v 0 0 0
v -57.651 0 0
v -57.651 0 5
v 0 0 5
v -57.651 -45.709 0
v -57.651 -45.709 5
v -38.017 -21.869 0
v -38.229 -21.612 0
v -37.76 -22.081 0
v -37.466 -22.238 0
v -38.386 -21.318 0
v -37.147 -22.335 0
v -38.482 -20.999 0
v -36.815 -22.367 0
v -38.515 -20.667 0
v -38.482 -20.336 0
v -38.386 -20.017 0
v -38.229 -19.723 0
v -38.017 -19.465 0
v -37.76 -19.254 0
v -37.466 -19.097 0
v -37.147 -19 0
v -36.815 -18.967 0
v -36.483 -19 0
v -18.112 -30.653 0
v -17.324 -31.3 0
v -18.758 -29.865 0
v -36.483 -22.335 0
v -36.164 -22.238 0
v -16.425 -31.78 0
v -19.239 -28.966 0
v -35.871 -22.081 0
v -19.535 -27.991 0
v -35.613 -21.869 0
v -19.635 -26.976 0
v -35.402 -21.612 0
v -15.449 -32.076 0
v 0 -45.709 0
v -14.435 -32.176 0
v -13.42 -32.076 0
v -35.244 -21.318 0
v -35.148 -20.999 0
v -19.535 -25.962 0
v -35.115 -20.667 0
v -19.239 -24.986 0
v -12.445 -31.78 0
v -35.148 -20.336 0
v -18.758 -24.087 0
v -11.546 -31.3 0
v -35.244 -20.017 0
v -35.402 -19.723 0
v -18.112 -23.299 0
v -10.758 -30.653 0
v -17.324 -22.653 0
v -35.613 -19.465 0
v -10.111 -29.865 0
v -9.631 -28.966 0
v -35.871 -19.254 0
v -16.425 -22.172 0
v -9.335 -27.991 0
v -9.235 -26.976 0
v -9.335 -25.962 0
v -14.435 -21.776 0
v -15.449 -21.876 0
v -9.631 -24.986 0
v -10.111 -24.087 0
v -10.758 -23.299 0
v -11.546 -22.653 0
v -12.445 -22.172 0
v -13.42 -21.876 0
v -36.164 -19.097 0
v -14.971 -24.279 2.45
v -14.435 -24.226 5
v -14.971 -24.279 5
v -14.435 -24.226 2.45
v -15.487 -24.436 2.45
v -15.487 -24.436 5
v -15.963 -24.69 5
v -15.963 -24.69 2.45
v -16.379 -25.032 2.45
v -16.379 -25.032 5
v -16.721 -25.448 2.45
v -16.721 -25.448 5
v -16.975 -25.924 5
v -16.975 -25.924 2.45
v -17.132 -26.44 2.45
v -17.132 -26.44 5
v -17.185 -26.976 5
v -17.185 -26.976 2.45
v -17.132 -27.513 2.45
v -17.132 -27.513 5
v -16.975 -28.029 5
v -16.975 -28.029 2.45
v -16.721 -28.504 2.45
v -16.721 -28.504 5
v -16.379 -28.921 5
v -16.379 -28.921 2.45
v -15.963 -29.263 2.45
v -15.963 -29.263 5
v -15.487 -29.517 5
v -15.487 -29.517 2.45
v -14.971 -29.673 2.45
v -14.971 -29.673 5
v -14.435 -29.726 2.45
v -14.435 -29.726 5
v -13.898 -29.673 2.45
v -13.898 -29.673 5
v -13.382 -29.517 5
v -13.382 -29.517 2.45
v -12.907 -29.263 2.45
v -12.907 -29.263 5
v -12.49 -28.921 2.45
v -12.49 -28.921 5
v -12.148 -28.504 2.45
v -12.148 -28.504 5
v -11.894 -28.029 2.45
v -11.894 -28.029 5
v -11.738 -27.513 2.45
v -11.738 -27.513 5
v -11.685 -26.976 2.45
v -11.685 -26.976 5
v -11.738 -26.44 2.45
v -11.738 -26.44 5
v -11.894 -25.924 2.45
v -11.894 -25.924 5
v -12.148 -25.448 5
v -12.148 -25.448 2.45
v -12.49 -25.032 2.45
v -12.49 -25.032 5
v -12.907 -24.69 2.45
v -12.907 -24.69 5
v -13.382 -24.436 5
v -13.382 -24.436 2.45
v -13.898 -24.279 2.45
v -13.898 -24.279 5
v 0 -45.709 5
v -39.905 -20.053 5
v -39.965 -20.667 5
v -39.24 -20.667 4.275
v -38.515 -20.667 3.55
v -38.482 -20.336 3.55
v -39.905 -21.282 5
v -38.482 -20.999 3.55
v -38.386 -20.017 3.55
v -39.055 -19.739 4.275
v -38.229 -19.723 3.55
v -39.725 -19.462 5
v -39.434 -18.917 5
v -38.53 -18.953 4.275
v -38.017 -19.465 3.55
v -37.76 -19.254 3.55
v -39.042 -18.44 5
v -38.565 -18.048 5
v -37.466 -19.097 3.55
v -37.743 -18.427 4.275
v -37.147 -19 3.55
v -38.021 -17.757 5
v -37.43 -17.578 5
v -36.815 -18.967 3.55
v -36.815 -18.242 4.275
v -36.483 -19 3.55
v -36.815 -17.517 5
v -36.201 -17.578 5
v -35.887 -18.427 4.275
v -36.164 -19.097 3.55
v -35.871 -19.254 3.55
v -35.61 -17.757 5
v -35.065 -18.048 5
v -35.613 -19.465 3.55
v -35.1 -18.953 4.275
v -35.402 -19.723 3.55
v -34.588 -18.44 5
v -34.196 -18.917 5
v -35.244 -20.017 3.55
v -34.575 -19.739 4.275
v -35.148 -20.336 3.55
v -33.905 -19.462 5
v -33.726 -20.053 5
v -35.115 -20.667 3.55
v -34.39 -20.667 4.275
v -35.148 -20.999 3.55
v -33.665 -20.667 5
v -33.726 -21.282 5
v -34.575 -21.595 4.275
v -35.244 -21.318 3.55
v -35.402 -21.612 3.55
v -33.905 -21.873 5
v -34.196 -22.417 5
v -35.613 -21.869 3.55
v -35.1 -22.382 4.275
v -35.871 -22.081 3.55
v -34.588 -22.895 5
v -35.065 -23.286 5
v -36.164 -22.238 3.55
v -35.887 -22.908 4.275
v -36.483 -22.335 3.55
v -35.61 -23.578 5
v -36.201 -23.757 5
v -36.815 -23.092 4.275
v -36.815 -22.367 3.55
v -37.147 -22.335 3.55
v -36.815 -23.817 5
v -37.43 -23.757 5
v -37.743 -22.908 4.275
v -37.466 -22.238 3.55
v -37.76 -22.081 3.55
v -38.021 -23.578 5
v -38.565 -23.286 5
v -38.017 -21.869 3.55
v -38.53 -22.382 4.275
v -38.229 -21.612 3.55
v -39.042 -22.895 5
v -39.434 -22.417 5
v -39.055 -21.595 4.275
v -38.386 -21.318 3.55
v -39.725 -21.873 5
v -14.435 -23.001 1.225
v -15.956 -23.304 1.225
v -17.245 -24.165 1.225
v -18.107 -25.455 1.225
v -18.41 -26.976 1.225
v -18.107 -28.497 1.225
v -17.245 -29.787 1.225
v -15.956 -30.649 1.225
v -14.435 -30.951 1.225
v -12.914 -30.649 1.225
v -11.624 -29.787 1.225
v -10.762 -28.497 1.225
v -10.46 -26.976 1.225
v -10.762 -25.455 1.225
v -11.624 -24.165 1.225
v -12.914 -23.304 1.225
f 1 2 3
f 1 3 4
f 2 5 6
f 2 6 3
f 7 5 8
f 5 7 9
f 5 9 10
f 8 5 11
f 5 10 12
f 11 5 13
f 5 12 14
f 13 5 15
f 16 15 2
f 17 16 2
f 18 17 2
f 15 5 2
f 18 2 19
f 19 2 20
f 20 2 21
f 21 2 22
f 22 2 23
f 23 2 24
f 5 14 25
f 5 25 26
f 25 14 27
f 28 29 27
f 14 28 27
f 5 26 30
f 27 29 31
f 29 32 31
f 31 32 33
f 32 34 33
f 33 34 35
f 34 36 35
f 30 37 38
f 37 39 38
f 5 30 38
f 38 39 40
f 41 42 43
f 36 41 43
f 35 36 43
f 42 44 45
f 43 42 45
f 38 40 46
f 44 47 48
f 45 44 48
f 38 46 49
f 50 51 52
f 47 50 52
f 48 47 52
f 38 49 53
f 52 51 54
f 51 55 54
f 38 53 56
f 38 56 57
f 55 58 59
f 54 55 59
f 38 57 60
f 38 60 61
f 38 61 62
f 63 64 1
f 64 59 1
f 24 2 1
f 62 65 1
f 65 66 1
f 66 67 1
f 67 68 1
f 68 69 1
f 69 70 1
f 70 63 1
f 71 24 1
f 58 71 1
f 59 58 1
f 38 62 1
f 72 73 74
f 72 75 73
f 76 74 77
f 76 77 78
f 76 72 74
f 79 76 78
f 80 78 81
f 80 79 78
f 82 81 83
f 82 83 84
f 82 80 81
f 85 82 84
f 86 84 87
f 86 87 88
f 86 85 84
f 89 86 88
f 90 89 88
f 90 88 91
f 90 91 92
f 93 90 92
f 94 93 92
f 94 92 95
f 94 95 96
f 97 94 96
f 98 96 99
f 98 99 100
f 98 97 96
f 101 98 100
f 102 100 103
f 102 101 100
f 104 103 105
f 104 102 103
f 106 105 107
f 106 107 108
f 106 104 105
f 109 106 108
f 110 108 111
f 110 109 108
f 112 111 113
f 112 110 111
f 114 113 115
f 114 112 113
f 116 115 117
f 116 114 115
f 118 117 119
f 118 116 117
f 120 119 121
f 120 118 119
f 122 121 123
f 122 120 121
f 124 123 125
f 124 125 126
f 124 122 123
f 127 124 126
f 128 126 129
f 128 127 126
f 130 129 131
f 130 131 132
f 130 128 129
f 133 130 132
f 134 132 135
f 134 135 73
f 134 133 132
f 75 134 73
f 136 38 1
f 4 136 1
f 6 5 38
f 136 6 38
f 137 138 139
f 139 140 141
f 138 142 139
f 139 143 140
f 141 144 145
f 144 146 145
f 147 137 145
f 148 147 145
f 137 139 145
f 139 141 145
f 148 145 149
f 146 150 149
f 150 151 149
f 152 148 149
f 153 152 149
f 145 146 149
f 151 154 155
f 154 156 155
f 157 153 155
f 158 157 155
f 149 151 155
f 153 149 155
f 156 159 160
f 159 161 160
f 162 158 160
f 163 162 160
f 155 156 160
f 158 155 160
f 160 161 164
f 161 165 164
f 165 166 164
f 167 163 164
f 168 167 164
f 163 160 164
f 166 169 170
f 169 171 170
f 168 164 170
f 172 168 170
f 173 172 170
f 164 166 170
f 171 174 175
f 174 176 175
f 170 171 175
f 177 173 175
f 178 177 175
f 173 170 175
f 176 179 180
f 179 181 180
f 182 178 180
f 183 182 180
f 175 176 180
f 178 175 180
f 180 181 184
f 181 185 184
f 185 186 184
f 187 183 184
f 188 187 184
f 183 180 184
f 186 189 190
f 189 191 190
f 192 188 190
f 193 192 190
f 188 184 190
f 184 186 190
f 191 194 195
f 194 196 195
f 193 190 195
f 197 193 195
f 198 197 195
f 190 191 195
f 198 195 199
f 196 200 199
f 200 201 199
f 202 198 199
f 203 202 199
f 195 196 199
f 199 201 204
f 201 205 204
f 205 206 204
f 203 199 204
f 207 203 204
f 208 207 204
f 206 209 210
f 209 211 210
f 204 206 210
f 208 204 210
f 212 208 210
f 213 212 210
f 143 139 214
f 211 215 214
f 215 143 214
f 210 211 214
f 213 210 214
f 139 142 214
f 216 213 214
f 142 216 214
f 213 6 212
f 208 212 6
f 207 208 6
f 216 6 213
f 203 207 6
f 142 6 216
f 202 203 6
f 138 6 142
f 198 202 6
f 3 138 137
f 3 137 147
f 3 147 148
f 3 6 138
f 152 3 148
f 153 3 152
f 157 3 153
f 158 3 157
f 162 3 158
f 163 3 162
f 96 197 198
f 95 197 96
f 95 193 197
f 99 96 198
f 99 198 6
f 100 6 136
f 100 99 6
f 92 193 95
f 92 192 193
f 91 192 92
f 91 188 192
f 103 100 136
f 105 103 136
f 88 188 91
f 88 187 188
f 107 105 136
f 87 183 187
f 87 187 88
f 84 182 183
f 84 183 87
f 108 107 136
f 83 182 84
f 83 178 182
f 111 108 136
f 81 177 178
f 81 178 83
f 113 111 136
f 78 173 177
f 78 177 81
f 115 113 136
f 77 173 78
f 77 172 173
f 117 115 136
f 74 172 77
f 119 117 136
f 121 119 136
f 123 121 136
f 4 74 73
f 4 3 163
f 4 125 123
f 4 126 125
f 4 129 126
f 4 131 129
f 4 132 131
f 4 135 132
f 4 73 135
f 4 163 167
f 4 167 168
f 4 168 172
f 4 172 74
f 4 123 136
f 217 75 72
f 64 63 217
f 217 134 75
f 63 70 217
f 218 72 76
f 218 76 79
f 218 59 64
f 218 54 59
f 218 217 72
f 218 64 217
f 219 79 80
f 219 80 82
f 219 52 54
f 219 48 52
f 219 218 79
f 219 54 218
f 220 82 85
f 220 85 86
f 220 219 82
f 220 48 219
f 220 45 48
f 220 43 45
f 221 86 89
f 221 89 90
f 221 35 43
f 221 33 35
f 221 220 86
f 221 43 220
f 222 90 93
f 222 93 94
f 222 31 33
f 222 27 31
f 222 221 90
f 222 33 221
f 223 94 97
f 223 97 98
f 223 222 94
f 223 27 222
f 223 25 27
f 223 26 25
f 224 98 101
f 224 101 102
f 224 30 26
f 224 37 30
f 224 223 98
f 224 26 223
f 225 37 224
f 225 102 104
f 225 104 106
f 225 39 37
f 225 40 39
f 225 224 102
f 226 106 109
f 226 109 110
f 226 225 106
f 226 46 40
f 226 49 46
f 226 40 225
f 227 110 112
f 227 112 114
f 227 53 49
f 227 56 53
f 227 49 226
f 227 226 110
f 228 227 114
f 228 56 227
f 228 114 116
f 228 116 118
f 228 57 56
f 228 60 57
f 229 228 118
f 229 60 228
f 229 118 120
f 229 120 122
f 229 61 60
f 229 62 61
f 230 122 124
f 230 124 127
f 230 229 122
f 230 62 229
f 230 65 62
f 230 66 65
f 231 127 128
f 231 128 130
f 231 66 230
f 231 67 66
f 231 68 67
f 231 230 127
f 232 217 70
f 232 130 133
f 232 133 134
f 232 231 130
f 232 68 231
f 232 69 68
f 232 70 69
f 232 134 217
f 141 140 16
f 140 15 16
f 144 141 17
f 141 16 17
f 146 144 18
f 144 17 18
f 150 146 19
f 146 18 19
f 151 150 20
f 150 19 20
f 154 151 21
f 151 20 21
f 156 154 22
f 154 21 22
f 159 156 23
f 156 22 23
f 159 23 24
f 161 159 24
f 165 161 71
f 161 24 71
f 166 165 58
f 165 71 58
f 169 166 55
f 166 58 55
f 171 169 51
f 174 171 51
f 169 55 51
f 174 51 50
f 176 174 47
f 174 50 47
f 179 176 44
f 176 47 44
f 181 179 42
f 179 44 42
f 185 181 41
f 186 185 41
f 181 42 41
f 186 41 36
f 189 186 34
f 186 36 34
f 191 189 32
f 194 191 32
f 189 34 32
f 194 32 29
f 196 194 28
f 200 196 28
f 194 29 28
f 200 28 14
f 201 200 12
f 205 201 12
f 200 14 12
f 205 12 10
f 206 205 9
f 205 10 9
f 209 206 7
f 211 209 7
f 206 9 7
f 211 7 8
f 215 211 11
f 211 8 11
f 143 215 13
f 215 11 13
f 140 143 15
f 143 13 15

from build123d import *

# Parameters (mm, degrees)
SKETCH1_W                                           = 57.650718963
SKETCH1_H                                           = 45.709483456
BOSS_EXTRUDE1_DEPTH                                 = 5
CSK_FOR_M3_COUNTERSUNK_FLAT_HEAD_SCREW2_D           = 3.4
CSK_FOR_M3_COUNTERSUNK_FLAT_HEAD_SCREW2_CSINK_D     = 6.3
CSK_FOR_M3_COUNTERSUNK_FLAT_HEAD_SCREW2_CSINK_ANGLE = 90


with BuildPart() as part:
    # Sketch1 → Boss-Extrude1 (new body)
    with BuildSketch(Plane.XY):
        with Locations((-28.825359482, -22.854741728)):
            Rectangle(SKETCH1_W, SKETCH1_H)
    extrude(amount=BOSS_EXTRUDE1_DEPTH)

    # CSK for M3 Countersunk Flat Head Screw2 (through all)
    with Locations(Plane.XY.offset(5)):
        with Locations((-36.815052067, -20.667361914)):
            CounterSinkHole(CSK_FOR_M3_COUNTERSUNK_FLAT_HEAD_SCREW2_D / 2, CSK_FOR_M3_COUNTERSUNK_FLAT_HEAD_SCREW2_CSINK_D / 2, counter_sink_angle=CSK_FOR_M3_COUNTERSUNK_FLAT_HEAD_SCREW2_CSINK_ANGLE)

    # Sketch13 → CSK for M5 Countersunk Flat Head Screw1 (revolve, cut)
    with BuildSketch(Plane(origin=(-14.434702808, -26.976225799, 0), x_dir=(0, 1, 0), z_dir=(1, 0, 0))):
        Polygon((0, 0), (0, 5), (2.75, 5), (2.75, 2.45), (5.2, 0), align=None)
    revolve(axis=Axis((-14.434702808, -26.976225799, -6.35), (0, 0, 1)), mode=Mode.SUBTRACT)


solid = part.part
